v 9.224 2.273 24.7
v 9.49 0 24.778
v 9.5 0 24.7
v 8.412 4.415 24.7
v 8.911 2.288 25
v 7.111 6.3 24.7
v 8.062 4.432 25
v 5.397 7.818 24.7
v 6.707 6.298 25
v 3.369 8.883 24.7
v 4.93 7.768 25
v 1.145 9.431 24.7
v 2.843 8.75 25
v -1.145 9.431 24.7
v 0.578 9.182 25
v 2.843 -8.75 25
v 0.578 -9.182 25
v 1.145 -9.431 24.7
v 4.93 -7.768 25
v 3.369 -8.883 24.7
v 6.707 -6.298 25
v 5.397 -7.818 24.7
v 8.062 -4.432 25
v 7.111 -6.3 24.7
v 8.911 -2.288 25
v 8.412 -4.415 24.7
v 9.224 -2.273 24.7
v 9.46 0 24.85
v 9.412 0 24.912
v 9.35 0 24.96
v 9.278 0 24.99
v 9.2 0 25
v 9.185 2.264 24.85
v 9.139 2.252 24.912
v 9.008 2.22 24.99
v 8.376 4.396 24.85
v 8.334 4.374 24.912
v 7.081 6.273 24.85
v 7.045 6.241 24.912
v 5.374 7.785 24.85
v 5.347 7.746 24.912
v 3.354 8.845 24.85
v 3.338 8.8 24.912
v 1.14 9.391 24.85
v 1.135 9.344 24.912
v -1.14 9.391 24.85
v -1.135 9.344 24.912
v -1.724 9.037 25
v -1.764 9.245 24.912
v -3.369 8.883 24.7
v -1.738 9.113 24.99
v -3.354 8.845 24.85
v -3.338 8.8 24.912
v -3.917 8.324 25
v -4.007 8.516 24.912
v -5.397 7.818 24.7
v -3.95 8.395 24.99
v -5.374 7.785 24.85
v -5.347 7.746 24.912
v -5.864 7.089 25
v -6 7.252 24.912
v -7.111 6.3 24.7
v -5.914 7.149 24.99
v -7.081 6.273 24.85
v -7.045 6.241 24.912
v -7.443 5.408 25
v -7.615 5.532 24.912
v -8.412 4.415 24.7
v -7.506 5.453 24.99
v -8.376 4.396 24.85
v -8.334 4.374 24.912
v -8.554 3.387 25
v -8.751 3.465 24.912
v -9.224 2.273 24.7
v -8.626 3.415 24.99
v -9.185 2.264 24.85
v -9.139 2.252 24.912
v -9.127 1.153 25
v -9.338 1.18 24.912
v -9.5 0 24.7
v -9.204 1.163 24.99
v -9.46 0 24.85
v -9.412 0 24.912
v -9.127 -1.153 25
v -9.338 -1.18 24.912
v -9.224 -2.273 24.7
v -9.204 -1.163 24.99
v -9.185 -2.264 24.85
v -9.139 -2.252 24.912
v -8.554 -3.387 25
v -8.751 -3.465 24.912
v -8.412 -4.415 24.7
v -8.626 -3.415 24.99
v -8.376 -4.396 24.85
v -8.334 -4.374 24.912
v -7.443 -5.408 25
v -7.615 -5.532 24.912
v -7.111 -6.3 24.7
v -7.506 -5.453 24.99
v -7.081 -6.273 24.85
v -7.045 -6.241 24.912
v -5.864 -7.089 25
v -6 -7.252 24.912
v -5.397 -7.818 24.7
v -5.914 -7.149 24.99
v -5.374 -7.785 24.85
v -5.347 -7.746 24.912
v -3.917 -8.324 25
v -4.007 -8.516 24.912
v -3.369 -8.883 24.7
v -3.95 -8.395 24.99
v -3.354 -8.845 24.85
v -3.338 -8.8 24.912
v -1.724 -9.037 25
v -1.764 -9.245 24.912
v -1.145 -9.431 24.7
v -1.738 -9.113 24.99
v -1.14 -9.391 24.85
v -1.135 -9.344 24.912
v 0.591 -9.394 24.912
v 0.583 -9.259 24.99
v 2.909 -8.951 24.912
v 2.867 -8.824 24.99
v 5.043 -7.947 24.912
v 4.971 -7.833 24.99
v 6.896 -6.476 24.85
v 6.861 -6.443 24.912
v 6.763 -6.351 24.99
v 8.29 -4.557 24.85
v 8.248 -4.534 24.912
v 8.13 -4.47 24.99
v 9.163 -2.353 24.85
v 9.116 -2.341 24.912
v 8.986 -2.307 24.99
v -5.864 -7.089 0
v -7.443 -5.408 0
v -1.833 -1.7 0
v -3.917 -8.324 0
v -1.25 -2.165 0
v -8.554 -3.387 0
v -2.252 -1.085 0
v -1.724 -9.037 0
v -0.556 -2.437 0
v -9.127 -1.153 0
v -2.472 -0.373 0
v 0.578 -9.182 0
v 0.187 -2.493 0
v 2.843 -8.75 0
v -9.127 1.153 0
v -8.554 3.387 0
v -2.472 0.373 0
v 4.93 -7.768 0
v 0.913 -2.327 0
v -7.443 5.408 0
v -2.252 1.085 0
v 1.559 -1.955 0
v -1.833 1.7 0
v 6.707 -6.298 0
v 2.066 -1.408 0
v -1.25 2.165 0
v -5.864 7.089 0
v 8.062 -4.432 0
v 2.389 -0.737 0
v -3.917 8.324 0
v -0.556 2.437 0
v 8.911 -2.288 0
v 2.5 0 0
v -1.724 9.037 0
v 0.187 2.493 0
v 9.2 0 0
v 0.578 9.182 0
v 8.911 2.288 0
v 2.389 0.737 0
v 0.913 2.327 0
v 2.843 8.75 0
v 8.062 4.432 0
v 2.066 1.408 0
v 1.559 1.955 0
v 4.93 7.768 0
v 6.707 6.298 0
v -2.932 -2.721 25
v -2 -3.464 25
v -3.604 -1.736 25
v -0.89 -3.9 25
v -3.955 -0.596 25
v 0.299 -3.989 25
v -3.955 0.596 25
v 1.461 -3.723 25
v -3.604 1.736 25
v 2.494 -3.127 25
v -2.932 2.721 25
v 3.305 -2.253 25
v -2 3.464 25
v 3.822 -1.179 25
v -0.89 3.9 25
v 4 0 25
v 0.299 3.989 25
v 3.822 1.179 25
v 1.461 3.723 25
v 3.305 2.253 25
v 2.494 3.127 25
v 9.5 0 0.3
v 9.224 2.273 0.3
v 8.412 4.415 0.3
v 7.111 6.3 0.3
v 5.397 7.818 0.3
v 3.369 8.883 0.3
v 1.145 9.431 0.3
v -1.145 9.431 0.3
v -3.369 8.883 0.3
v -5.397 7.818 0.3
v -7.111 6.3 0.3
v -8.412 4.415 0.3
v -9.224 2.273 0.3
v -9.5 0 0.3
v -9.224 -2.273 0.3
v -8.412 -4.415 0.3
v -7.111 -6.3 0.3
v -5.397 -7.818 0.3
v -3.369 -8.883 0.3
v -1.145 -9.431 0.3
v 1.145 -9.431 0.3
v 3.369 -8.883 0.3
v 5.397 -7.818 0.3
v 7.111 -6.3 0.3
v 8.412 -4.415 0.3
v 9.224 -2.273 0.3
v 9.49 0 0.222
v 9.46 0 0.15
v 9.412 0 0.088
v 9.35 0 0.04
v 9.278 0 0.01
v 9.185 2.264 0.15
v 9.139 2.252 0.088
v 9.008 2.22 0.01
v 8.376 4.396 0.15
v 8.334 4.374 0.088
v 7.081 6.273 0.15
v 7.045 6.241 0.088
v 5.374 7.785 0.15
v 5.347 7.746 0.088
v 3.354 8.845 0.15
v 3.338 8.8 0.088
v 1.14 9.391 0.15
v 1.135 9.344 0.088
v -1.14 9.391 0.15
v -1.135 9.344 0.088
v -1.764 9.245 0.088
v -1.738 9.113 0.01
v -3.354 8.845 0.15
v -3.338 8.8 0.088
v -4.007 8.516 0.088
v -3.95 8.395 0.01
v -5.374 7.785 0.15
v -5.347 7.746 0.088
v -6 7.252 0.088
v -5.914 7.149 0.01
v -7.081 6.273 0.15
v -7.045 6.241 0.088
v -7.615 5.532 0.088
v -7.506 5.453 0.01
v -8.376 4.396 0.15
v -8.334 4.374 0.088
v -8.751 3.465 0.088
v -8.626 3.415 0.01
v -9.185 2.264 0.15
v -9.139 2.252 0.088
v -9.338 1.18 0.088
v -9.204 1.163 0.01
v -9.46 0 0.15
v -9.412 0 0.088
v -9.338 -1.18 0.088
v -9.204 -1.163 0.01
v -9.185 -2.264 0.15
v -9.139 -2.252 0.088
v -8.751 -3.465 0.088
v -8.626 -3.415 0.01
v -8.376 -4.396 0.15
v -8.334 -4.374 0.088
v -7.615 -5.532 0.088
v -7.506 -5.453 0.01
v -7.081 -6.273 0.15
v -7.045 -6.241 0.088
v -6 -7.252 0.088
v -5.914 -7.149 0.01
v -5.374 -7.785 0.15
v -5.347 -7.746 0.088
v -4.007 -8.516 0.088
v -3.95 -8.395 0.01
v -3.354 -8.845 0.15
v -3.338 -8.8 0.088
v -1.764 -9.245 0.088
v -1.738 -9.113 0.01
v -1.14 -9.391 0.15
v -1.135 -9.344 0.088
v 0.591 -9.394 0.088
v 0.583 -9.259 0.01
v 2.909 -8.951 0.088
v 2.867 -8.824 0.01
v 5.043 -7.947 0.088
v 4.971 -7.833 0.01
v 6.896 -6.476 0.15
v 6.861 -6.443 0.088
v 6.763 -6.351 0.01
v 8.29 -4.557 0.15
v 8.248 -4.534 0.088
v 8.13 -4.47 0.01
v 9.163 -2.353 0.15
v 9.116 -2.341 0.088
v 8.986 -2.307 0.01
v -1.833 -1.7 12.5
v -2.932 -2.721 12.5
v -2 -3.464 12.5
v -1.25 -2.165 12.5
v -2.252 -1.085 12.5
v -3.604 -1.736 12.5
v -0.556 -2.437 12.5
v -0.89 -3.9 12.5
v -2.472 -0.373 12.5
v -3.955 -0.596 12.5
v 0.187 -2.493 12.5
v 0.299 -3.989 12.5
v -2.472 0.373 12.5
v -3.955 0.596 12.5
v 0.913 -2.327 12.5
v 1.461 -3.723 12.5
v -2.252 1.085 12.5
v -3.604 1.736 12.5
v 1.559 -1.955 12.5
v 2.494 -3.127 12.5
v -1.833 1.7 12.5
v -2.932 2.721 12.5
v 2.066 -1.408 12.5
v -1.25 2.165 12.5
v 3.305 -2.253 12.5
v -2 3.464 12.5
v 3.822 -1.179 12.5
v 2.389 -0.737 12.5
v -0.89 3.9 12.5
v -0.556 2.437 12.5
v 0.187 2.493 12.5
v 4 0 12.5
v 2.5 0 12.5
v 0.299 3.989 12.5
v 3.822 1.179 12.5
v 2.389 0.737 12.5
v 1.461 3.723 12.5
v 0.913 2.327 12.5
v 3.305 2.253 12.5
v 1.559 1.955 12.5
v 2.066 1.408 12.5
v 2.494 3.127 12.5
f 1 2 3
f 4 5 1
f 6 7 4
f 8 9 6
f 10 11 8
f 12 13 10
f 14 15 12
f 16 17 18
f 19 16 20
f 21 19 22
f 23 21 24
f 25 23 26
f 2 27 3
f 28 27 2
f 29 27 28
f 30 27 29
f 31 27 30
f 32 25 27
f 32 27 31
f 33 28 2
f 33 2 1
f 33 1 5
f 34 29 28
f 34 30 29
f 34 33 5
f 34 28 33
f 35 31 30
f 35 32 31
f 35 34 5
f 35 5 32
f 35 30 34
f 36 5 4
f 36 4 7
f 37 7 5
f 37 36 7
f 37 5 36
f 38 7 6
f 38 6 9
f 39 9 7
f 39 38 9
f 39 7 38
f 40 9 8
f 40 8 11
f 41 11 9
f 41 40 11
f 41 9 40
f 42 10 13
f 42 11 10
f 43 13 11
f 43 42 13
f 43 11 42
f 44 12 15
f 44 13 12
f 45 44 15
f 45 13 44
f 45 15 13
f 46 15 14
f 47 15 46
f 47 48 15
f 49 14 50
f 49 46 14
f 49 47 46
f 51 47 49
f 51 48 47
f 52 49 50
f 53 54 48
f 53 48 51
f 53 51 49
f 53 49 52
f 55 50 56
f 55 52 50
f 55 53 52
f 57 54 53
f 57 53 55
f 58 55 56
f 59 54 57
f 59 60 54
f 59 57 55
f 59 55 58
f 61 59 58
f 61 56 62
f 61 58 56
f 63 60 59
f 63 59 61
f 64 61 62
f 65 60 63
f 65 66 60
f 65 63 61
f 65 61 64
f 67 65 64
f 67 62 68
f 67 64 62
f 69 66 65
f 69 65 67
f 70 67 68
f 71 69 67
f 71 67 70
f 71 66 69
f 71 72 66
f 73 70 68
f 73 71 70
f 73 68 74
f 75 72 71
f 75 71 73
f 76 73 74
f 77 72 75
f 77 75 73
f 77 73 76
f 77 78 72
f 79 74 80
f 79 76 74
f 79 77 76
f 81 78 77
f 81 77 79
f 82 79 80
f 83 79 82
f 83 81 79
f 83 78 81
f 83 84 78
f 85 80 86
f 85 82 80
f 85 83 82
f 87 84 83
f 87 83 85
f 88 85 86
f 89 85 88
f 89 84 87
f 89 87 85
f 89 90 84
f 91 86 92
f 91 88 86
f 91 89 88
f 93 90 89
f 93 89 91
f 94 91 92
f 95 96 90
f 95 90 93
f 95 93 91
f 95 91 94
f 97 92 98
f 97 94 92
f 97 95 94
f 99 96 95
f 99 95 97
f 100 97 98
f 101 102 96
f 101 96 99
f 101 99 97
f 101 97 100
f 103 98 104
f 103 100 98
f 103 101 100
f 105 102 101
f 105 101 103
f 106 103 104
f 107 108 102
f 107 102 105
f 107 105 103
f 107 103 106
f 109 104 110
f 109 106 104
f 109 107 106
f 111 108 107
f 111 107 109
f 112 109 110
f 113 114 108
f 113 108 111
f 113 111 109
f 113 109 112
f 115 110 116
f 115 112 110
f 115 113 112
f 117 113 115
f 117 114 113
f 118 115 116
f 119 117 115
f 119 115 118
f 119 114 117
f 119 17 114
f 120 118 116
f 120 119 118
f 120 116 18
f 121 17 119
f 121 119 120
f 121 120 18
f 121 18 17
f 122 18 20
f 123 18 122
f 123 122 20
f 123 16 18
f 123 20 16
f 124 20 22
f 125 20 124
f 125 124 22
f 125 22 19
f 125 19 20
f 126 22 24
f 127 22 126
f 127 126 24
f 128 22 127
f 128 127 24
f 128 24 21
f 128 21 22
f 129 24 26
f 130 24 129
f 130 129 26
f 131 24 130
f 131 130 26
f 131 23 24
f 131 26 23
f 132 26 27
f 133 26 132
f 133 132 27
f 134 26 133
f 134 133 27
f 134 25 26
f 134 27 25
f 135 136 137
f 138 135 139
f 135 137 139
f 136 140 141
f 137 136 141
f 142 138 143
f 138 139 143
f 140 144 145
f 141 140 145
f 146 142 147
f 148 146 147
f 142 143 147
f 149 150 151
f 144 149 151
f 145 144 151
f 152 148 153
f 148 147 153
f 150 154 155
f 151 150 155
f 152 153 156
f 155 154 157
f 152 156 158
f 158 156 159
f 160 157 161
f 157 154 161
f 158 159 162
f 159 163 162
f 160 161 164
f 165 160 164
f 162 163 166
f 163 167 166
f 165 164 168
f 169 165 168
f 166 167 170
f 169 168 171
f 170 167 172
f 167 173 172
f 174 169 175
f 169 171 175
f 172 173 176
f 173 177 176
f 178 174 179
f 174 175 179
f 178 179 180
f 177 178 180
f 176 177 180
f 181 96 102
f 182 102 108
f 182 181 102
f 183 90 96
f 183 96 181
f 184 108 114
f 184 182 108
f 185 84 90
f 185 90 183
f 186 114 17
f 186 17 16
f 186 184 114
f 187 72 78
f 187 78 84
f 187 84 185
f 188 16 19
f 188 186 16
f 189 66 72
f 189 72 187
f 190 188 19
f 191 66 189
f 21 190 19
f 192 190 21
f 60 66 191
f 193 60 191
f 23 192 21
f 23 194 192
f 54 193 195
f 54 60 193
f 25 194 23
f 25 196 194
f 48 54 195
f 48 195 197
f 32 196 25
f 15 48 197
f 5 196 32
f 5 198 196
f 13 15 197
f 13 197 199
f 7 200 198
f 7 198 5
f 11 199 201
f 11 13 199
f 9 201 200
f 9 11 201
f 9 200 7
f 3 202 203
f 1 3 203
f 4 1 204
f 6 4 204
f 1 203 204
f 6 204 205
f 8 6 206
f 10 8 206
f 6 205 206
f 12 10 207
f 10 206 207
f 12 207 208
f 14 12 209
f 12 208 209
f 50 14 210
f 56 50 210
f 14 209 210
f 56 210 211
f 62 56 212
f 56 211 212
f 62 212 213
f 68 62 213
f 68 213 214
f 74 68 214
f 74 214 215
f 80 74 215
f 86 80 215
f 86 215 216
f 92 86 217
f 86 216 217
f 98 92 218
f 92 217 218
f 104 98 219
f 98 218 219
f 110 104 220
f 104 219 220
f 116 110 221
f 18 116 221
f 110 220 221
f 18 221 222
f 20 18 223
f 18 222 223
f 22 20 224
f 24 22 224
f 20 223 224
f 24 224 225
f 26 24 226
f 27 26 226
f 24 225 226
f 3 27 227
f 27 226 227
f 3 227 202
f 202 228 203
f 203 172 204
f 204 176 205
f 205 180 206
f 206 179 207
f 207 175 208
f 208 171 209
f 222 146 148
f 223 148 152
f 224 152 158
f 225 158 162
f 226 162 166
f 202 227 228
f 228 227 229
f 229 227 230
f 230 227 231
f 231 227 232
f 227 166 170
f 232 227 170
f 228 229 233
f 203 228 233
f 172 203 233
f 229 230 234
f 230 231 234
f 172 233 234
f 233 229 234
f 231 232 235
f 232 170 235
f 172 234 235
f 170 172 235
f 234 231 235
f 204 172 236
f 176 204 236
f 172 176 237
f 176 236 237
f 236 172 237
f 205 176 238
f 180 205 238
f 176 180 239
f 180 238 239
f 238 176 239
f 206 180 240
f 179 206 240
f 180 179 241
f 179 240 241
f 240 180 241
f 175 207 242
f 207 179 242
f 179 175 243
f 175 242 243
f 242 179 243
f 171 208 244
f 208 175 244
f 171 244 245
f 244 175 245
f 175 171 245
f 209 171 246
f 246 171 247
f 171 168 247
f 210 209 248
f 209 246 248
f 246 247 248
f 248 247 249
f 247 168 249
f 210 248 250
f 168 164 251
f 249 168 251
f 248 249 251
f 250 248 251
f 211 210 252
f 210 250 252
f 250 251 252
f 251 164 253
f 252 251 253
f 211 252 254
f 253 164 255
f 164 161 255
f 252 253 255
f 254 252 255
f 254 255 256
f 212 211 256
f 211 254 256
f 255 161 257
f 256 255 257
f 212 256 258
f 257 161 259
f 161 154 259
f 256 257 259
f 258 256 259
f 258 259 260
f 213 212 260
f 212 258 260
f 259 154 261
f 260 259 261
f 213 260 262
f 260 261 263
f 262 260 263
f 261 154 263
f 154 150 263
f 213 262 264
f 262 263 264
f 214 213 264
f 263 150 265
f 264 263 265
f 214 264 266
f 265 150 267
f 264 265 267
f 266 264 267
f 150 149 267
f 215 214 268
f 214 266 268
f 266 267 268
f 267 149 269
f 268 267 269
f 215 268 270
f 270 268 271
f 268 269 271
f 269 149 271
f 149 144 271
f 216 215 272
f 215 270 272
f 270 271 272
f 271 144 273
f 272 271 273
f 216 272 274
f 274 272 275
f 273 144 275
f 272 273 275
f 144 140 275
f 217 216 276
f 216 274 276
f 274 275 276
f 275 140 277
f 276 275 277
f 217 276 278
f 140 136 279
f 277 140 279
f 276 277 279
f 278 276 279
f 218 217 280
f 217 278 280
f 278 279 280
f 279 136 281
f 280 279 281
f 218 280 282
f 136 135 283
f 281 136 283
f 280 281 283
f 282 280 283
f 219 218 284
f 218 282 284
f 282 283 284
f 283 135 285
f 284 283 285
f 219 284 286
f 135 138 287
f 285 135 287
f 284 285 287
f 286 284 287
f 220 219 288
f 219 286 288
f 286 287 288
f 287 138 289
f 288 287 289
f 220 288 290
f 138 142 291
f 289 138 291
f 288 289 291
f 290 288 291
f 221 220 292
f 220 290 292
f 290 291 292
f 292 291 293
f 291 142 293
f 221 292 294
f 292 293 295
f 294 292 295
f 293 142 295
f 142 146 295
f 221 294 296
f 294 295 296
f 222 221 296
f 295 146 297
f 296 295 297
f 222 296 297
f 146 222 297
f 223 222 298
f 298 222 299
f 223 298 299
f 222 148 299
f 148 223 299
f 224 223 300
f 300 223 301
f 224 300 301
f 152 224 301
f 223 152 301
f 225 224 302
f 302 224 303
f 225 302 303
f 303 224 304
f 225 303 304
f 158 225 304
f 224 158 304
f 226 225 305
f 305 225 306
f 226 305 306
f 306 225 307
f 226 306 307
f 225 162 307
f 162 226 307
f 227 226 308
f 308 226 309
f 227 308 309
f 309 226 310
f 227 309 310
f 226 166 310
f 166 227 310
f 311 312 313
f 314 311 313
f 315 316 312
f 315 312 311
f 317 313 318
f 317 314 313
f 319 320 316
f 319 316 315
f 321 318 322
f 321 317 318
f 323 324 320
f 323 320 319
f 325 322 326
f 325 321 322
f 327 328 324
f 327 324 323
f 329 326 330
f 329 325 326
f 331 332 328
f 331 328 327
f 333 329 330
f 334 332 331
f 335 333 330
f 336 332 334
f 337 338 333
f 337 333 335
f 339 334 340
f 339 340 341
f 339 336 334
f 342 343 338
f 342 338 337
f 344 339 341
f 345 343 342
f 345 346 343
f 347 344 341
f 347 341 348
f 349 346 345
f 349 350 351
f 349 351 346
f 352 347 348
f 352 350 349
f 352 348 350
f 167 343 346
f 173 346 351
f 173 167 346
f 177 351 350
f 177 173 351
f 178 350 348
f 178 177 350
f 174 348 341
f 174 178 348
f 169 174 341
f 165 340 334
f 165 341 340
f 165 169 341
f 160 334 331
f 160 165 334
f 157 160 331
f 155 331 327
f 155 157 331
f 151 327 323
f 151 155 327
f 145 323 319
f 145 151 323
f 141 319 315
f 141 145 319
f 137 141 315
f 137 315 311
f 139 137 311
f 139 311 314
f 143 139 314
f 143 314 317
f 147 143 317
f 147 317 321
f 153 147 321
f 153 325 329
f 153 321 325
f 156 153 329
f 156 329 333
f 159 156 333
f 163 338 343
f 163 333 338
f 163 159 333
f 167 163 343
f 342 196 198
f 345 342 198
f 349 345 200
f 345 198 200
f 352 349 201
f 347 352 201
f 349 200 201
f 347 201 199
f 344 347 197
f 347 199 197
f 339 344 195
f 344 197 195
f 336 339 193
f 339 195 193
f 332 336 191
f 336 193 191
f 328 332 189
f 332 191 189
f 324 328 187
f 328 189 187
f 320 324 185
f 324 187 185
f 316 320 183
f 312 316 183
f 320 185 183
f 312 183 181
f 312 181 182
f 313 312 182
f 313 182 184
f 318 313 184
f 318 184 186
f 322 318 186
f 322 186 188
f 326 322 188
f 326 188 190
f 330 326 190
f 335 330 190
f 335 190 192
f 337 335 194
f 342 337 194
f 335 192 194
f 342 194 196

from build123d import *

# Parameters (mm, degrees)
SKETCH_1_R          = 9.5
SKETCH_1_R_2        = 2.5
EXTRUDE_1_DEPTH     = 25
SKETCH_2_R          = 4
CUT_EXTRUDE_1_DEPTH = 12.5
FILLET_1_R          = 0.3


with BuildPart() as part:
    # 草图1 → 凸台-拉伸1 (new body)
    with BuildSketch(Plane.XY):
        Circle(SKETCH_1_R)
        Circle(SKETCH_1_R_2, mode=Mode.SUBTRACT)
    extrude(amount=EXTRUDE_1_DEPTH)

    # 草图2 → 切除-拉伸1 (cut)
    with BuildSketch(Plane.XY.offset(25)):
        Circle(SKETCH_2_R)
    extrude(amount=-CUT_EXTRUDE_1_DEPTH, mode=Mode.SUBTRACT)

    # 圆角1
    fillet_1_edges = [part.edges().sort_by_distance(p)[0] for p in [
        (-9.5, 0, 0),
        (-9.5, 0, 25),
    ]]
    fillet(fillet_1_edges, radius=FILLET_1_R)


solid = part.part
